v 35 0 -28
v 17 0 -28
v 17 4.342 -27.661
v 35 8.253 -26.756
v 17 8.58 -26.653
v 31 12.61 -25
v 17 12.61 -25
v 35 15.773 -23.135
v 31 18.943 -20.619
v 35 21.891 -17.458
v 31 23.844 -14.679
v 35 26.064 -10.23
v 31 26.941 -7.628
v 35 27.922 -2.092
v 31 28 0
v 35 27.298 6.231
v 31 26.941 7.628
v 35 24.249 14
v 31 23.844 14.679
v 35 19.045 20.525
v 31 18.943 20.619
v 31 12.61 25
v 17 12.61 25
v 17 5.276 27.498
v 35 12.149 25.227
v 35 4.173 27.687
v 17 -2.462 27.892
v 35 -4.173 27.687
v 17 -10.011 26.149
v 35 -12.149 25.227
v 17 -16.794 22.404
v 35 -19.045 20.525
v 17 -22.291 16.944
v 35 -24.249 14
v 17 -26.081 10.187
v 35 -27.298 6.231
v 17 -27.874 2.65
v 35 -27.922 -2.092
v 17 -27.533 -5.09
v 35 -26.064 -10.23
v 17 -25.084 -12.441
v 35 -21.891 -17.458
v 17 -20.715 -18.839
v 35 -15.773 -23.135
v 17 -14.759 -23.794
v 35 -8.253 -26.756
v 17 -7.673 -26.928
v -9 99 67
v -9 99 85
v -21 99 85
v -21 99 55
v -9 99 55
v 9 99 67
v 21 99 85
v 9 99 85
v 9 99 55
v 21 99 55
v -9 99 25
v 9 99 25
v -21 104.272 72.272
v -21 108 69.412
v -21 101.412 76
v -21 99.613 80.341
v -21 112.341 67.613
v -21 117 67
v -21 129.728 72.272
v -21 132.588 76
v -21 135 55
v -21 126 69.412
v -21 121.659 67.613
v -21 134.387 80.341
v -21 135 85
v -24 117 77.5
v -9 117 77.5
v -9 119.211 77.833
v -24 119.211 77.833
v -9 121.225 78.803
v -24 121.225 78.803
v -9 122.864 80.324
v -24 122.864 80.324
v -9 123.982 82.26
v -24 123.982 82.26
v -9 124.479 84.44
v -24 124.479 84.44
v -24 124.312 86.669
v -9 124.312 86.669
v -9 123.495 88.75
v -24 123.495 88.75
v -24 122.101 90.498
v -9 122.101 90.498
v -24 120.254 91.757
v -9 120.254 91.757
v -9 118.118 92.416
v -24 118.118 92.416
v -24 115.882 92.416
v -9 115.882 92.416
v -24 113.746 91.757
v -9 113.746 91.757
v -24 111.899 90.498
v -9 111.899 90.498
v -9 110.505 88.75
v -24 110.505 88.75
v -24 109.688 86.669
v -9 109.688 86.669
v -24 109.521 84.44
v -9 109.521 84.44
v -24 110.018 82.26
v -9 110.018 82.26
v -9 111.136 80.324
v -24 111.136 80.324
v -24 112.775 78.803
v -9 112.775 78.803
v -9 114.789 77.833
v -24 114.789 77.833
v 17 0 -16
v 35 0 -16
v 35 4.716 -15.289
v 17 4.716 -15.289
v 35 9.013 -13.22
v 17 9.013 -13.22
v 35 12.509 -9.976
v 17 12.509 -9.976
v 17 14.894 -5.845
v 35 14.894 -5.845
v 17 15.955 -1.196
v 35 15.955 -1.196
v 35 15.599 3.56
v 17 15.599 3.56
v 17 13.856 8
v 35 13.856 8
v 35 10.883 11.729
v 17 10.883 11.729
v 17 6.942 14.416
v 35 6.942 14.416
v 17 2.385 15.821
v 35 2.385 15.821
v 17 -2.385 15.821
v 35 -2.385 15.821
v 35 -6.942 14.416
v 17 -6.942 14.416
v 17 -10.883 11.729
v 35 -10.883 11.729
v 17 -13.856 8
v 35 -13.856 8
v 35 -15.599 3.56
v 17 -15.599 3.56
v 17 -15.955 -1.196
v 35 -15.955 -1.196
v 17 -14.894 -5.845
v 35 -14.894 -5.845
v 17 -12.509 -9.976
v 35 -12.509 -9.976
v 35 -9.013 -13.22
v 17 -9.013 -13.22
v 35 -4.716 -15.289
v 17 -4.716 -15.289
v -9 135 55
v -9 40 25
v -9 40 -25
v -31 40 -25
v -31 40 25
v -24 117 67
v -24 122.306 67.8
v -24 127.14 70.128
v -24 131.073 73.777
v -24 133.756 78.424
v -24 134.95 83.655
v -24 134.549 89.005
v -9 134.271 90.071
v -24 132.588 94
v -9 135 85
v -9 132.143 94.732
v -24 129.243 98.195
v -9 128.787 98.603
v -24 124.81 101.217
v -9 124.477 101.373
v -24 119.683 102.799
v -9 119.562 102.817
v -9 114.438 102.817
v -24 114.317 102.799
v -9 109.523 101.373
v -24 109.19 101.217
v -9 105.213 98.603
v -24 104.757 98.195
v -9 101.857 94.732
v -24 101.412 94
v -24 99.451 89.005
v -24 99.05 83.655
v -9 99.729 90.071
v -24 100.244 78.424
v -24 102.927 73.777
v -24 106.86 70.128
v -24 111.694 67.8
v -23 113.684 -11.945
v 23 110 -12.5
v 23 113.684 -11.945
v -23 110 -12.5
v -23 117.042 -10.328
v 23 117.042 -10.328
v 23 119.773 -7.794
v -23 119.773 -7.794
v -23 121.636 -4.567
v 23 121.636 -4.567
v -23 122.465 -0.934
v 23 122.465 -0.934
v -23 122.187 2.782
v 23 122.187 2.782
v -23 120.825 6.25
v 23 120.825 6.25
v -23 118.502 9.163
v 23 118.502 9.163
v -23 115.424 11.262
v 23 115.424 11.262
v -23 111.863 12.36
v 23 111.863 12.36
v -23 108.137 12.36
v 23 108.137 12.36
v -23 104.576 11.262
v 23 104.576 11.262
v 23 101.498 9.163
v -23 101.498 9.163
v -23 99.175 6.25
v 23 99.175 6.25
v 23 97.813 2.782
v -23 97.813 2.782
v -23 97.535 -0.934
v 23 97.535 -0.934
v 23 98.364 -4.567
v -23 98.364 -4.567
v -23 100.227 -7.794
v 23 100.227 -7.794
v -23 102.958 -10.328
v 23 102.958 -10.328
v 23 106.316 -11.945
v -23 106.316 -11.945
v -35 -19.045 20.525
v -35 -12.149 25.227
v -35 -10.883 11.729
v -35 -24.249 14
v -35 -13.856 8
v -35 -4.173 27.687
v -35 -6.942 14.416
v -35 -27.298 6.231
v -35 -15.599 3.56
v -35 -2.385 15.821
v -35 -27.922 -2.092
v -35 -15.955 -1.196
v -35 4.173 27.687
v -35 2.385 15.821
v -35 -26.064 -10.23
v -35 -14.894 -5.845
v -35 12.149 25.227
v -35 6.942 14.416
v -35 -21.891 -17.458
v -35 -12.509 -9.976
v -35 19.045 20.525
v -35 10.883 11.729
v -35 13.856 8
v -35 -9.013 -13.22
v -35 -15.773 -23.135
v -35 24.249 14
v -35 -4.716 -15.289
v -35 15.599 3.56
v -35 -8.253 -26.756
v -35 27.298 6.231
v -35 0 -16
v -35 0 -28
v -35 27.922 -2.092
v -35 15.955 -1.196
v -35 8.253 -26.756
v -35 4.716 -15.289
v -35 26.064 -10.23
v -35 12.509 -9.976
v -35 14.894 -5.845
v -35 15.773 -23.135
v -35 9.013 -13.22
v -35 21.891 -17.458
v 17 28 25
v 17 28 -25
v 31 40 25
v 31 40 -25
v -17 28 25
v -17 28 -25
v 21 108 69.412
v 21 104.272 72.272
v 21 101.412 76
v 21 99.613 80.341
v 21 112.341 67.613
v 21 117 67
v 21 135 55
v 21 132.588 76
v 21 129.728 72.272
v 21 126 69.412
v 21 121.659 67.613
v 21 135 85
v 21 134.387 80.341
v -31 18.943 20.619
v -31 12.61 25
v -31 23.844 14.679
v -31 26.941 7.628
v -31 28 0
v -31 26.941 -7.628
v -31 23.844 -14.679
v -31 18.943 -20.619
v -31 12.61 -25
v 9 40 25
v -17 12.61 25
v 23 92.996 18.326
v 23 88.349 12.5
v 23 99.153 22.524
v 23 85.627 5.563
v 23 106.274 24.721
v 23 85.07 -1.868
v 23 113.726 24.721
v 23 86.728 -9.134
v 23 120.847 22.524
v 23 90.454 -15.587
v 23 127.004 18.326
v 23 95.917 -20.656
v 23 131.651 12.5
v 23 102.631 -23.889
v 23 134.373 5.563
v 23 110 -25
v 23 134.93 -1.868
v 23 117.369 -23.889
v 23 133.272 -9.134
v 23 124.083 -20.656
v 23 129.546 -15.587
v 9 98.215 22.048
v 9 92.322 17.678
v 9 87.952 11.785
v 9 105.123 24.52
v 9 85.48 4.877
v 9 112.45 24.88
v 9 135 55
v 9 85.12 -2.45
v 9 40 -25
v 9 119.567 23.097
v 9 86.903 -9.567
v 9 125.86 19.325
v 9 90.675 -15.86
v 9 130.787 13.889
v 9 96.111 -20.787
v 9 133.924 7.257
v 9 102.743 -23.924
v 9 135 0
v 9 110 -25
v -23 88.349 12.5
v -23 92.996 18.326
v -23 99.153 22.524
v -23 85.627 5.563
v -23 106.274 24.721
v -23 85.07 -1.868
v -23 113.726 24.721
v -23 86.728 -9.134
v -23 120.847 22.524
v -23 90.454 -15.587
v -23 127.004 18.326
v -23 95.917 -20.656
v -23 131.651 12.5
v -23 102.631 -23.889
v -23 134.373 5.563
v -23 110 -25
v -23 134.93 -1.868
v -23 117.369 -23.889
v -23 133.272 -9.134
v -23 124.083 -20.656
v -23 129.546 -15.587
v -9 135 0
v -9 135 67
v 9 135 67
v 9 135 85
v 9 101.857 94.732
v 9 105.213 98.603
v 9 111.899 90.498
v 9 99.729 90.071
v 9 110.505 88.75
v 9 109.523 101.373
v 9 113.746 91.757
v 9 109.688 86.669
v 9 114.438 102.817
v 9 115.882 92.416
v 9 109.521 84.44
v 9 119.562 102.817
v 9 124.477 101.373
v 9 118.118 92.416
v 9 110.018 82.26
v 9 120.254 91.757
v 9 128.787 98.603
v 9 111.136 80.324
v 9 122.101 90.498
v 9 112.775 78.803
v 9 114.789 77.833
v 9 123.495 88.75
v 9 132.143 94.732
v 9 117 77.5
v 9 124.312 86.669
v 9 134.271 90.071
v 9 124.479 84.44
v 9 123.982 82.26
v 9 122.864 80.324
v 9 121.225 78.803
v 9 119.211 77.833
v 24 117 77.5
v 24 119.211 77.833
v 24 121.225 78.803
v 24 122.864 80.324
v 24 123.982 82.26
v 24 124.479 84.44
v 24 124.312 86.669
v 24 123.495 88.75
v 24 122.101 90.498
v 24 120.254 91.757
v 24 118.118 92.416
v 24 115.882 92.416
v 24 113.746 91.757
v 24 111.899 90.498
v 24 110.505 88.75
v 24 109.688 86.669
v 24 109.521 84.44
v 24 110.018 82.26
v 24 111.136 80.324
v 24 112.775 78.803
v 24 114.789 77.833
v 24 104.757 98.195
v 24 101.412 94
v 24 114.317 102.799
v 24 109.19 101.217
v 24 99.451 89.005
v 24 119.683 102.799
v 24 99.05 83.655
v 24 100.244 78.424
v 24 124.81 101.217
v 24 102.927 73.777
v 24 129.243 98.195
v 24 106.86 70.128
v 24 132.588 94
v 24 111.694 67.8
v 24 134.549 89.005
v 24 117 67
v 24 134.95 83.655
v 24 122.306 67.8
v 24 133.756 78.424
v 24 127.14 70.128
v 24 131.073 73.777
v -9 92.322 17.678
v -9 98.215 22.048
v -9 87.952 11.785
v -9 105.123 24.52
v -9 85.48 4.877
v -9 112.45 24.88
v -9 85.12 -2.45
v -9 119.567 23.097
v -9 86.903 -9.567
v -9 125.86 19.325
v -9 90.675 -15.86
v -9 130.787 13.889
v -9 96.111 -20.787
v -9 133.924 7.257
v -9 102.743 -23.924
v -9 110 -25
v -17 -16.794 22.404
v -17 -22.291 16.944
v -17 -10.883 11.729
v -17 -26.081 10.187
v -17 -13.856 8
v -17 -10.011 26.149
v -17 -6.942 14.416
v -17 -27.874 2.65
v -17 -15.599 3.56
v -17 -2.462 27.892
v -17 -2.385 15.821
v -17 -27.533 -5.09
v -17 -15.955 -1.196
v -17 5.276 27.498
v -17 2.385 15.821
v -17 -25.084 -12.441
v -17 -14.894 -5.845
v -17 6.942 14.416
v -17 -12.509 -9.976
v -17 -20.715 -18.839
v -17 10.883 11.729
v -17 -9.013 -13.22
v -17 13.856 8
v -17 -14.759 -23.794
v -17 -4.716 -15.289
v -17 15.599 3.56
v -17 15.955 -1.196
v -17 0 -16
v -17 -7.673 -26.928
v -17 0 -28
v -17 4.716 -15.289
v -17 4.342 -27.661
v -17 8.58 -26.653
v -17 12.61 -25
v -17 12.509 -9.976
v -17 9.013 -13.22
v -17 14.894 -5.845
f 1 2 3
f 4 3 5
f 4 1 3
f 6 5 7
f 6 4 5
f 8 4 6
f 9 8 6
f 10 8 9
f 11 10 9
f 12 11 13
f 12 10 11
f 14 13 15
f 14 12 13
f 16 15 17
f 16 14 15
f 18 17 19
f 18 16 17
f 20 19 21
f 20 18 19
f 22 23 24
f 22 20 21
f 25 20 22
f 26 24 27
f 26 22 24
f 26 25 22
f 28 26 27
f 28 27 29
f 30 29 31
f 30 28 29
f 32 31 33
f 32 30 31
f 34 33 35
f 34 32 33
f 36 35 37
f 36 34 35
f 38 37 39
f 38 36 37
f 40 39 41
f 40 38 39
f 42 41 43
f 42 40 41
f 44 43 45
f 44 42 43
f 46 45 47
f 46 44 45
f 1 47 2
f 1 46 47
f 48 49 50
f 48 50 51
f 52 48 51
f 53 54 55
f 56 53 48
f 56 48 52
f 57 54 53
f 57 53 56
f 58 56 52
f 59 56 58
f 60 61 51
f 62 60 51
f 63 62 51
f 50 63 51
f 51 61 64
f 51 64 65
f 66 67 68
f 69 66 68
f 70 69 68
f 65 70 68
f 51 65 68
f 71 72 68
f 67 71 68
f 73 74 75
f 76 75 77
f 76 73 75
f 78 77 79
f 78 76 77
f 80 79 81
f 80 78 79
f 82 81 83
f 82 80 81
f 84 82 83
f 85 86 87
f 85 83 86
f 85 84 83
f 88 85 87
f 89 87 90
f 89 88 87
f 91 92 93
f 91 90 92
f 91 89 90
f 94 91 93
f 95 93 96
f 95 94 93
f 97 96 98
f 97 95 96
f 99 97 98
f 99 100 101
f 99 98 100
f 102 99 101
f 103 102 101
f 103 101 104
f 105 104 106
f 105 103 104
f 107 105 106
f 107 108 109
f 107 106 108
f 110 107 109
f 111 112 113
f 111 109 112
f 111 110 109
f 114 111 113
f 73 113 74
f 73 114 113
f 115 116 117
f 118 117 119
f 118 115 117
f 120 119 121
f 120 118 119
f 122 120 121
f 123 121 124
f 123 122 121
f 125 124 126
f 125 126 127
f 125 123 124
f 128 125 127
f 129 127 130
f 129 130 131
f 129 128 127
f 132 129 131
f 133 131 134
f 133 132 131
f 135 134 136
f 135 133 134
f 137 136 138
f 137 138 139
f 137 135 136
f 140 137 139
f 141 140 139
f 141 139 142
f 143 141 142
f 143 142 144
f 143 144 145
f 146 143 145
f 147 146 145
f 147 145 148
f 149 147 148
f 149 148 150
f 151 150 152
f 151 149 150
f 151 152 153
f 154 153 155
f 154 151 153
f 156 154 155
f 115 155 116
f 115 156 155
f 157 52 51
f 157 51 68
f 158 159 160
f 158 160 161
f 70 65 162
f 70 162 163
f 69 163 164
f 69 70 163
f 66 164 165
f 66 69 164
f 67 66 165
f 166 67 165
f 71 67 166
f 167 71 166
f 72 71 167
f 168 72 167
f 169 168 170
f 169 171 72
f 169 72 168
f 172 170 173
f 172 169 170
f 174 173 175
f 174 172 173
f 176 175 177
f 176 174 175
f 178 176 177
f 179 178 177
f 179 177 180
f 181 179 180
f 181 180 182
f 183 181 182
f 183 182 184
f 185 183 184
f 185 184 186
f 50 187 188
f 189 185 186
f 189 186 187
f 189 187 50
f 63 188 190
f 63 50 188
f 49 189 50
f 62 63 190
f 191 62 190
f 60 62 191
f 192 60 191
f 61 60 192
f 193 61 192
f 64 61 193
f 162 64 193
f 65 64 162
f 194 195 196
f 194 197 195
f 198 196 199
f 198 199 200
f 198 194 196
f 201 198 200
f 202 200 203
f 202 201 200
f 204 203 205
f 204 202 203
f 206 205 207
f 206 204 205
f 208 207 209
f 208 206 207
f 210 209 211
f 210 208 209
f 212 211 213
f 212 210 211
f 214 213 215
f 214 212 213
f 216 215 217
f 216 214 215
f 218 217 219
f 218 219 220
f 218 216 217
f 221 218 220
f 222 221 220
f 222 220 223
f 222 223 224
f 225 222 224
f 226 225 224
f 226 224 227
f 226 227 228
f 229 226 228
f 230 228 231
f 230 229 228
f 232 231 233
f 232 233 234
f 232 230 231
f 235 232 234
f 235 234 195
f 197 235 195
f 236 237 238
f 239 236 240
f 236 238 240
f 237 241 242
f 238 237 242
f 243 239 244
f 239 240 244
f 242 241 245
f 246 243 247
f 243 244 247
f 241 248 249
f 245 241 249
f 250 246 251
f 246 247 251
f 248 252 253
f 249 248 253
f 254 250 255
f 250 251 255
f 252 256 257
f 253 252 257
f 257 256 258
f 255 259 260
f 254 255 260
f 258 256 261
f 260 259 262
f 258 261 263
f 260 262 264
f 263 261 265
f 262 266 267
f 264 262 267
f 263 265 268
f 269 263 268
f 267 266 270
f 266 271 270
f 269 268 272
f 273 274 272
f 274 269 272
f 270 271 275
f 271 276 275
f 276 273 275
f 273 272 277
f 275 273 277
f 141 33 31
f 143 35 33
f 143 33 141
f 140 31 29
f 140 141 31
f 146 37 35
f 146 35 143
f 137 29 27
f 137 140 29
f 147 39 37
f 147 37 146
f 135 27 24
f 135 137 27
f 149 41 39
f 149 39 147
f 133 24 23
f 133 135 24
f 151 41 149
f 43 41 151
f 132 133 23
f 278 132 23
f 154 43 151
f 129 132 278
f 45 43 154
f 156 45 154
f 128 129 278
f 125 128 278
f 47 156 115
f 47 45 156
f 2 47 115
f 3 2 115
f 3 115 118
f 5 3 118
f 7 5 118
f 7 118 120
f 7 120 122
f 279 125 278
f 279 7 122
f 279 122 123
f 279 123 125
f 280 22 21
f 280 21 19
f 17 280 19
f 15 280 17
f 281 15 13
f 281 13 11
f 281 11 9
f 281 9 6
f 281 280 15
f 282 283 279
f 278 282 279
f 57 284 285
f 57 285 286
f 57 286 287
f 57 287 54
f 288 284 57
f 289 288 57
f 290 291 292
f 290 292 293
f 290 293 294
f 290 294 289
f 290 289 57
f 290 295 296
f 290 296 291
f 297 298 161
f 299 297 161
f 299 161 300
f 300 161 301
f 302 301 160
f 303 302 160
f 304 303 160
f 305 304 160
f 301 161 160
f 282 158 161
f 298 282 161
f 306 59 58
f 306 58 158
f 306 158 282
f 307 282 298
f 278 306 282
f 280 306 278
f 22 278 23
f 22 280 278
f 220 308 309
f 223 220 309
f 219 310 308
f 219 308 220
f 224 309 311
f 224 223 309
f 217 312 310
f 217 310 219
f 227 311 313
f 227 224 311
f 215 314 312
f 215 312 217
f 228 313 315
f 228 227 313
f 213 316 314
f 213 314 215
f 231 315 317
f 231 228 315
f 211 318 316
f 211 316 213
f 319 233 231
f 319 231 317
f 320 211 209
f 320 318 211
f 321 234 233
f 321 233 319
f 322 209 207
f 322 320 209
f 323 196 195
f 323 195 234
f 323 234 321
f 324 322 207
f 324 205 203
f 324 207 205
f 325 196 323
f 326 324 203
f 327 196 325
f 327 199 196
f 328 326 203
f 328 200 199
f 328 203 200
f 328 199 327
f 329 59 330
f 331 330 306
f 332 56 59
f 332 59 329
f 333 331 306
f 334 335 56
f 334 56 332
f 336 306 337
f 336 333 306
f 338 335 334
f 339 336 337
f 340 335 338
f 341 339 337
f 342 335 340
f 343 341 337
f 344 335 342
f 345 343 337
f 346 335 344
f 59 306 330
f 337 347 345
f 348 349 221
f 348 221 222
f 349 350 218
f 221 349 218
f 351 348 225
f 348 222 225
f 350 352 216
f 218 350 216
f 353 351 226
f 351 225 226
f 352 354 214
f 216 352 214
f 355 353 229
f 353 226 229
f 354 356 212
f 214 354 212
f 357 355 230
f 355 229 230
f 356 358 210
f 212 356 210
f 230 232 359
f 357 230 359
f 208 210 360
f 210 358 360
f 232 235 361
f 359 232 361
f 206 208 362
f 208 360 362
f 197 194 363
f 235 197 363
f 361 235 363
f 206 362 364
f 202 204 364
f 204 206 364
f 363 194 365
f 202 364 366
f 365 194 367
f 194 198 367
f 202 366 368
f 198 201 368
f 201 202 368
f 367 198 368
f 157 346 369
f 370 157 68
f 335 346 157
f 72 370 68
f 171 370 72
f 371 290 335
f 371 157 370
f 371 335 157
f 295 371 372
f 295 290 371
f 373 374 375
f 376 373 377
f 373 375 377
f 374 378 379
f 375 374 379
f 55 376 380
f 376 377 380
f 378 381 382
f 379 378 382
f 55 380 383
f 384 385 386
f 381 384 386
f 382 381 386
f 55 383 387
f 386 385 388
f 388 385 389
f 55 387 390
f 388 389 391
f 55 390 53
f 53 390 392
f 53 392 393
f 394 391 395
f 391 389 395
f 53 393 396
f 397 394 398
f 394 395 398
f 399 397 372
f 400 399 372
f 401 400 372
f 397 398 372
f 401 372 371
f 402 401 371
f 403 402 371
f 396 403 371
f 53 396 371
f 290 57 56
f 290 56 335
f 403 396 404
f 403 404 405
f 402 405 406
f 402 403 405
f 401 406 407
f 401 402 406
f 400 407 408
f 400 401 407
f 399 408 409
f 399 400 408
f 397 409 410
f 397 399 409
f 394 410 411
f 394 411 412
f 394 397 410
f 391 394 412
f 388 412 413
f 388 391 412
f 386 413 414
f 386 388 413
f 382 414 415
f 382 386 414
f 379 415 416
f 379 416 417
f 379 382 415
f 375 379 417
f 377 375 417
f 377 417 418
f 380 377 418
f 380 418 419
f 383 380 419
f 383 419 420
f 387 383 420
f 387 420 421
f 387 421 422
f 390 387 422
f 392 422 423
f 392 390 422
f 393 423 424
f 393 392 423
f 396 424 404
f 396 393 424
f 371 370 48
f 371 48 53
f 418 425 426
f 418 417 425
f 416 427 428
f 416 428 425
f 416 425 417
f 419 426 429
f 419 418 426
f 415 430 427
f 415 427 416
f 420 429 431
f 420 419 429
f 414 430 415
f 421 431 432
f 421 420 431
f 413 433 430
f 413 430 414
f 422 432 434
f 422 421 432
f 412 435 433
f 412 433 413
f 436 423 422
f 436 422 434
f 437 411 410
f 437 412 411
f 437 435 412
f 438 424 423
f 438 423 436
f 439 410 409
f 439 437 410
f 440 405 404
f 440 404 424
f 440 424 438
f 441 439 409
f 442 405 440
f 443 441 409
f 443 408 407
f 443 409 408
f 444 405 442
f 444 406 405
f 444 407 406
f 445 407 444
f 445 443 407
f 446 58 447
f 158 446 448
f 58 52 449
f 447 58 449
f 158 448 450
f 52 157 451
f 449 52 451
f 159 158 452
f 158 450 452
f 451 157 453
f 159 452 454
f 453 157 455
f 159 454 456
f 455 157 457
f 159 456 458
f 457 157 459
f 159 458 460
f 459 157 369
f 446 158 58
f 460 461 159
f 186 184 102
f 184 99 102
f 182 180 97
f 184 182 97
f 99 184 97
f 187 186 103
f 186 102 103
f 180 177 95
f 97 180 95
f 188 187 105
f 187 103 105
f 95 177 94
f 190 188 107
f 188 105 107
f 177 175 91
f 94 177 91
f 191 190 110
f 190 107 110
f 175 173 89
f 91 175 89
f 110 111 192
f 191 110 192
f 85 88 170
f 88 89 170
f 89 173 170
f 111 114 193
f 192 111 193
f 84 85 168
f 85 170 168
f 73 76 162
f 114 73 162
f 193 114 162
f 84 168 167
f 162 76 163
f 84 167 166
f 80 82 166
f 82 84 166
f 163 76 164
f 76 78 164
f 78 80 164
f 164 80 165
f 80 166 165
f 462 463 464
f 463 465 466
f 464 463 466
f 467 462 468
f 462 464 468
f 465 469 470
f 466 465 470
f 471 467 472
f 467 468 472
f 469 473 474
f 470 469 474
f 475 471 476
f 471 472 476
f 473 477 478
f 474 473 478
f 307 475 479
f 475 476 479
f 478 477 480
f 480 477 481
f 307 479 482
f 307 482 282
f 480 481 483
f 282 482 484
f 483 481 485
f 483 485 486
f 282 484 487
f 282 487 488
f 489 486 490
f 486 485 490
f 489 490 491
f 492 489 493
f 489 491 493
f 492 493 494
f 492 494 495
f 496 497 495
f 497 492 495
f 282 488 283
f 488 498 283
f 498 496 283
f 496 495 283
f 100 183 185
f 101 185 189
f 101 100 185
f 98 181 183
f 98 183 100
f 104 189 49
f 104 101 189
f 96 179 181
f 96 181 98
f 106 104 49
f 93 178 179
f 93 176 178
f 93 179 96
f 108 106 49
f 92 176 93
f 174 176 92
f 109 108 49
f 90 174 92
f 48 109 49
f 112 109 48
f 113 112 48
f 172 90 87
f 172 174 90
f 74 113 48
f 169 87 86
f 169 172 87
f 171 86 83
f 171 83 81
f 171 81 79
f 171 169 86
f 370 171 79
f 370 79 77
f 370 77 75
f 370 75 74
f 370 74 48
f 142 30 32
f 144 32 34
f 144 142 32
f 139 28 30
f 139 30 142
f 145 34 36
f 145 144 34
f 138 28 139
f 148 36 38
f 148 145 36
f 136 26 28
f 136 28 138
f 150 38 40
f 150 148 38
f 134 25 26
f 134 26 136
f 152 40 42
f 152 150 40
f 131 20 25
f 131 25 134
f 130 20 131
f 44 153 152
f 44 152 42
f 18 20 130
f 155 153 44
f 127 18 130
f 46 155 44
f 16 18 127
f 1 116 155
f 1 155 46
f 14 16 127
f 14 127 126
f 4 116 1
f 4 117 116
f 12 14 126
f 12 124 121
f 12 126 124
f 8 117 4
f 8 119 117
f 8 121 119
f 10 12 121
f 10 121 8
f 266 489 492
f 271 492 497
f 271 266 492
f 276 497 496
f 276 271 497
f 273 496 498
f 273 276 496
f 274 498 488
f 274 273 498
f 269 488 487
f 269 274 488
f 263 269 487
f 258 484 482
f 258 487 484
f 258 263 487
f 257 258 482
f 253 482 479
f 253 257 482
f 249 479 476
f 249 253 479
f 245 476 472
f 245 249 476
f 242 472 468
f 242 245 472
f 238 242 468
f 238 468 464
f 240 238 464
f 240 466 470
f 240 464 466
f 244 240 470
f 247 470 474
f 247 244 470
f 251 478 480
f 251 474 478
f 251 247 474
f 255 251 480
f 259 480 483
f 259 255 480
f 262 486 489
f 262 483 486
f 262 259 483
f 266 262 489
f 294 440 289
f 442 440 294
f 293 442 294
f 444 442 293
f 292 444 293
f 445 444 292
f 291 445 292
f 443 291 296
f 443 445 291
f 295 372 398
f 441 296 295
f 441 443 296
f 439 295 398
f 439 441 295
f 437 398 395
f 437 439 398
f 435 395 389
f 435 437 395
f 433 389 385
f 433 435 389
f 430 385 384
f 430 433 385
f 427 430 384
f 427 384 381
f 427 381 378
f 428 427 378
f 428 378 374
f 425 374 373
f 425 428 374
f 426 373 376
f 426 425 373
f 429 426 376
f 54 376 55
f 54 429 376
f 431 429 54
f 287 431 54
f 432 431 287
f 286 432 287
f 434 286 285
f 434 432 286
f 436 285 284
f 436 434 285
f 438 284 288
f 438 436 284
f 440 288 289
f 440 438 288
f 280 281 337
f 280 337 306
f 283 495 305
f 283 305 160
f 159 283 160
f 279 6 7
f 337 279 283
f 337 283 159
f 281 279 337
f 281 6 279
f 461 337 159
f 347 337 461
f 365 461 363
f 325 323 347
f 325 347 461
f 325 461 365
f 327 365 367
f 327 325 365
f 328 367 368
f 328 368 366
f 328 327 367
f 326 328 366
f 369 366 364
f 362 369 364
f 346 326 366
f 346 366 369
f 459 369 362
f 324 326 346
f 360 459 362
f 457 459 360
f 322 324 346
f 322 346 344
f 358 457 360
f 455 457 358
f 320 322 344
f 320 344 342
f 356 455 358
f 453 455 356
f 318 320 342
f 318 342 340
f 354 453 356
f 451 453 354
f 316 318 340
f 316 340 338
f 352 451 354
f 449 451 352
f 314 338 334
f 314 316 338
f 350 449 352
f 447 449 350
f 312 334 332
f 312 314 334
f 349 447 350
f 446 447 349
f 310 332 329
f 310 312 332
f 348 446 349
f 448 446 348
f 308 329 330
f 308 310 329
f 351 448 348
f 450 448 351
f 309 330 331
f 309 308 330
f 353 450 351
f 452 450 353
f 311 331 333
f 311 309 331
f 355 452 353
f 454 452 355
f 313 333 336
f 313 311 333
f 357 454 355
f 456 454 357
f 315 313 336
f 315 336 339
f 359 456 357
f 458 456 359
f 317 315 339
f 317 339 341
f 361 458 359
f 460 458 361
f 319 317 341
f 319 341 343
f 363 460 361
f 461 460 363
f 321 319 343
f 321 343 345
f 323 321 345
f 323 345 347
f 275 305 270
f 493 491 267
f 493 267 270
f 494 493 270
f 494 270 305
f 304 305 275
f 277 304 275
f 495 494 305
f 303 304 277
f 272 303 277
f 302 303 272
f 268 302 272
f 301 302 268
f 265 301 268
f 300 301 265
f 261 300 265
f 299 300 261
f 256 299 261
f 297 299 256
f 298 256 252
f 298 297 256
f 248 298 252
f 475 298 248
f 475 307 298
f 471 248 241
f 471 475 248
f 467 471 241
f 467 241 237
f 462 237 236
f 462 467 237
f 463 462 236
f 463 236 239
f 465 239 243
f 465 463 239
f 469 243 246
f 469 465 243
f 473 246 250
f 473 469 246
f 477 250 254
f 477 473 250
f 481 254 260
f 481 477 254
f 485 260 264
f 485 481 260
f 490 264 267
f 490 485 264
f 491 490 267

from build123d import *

# Parameters (mm, degrees)
BOSS_EXTRUDE1_DEPTH     = 9
SKETCH1_3_R             = 25
SKETCH1_3_R_2           = 12.5
BOSS_EXTRUDE2_DEPTH     = 23
SKETCH1_5_R             = 28
SKETCH1_5_R_2           = 16
BOSS_EXTRUDE3_DEPTH     = 35
BOSS_EXTRUDE4_DEPTH     = 31
BOSS_EXTRUDE5_DEPTH     = 21
SKETCH1_8_R             = 18
SKETCH1_8_R_2           = 7.5
BOSS_EXTRUDE6_DEPTH     = 24
SKETCH2_W               = 34
SKETCH2_H               = 56
CUT_EXTRUDE1_DEPTH      = 104
CUT_EXTRUDE1_DEPTH_BACK = 29
SKETCH3_W               = 18
SKETCH3_H               = 36
CUT_EXTRUDE2_DEPTH      = 1
CUT_EXTRUDE2_DEPTH_BACK = 164


with BuildPart() as part:
    # Sketch1 → Boss-Extrude1 (new body, symmetric)
    with BuildSketch(Plane(origin=(0, 0, 0), x_dir=(0, 0, -1), z_dir=(1, 0, 0))):
        with BuildLine():
            ThreePointArc((25, 110), (-17.67766953, 92.32233047), (0, 135))
            Line((0, 135), (-55, 135))
            Line((-55, 135), (-55, 99))
            Line((-55, 99), (-25, 99))
            Line((-25, 99), (-25, 40))
            Line((-25, 40), (25, 40))
            Line((25, 40), (25, 110))
        make_face()
    extrude(amount=BOSS_EXTRUDE1_DEPTH, both=True)

    # Sketch1<3> → Boss-Extrude2 (add, symmetric)
    with BuildSketch(Plane(origin=(0, 0, 0), x_dir=(0, 0, -1), z_dir=(1, 0, 0))):
        with Locations((0, 110)):
            Circle(SKETCH1_3_R)
        with Locations((0, 110)):
            Circle(SKETCH1_3_R_2, mode=Mode.SUBTRACT)
    extrude(amount=BOSS_EXTRUDE2_DEPTH, both=True)



with BuildPart() as body_2:
    # Sketch1<5> → Boss-Extrude3 (new body, symmetric)
    with BuildSketch(Plane(origin=(0, 0, 0), x_dir=(0, 0, -1), z_dir=(1, 0, 0))):
        Circle(SKETCH1_5_R)
        Circle(SKETCH1_5_R_2, mode=Mode.SUBTRACT)
    extrude(amount=BOSS_EXTRUDE3_DEPTH, both=True)


with BuildPart() as part_1:
    add(part.part)

    add(body_2.part)  # Boss-Extrude4 merges body 2
    # Sketch1<6> → Boss-Extrude4 (add, symmetric)
    with BuildSketch(Plane(origin=(0, 0, 0), x_dir=(0, 0, -1), z_dir=(1, 0, 0))):
        with BuildLine():
            Line((25, 40), (-25, 40))
            Line((-25, 40), (-25, 12.609520213))
            ThreePointArc((-25, 12.609520213), (0, 28), (25, 12.609520213))
            Line((25, 12.609520213), (25, 40))
        make_face()
    extrude(amount=BOSS_EXTRUDE4_DEPTH, both=True)

    # Sketch1<7> → Boss-Extrude5 (add, symmetric)
    with BuildSketch(Plane(origin=(0, 0, 0), x_dir=(0, 0, -1), z_dir=(1, 0, 0))):
        with BuildLine():
            Line((-85, 99), (-55, 99))
            Line((-55, 99), (-55, 135))
            Line((-55, 135), (-85, 135))
            ThreePointArc((-85, 135), (-72.272077939, 129.727922061), (-67, 117))
            ThreePointArc((-67, 117), (-72.272077939, 104.272077939), (-85, 99))
        make_face()
    extrude(amount=BOSS_EXTRUDE5_DEPTH, both=True)

    # Sketch1<8> → Boss-Extrude6 (add, symmetric)
    with BuildSketch(Plane(origin=(0, 0, 0), x_dir=(0, 0, -1), z_dir=(1, 0, 0))):
        with Locations((-85, 117)):
            Circle(SKETCH1_8_R)
        with Locations((-85, 117)):
            Circle(SKETCH1_8_R_2, mode=Mode.SUBTRACT)
    extrude(amount=BOSS_EXTRUDE6_DEPTH, both=True)

    # Sketch2 → Cut-Extrude1 (cut, two sides)
    with BuildSketch(Plane.XY) as cut_extrude1_sk:
        Rectangle(SKETCH2_W, SKETCH2_H)
    extrude(amount=CUT_EXTRUDE1_DEPTH, mode=Mode.SUBTRACT)
    extrude(cut_extrude1_sk.sketch, amount=-CUT_EXTRUDE1_DEPTH_BACK, mode=Mode.SUBTRACT)

    # Sketch3 → Cut-Extrude2 (cut, two sides)
    with BuildSketch(Plane(origin=(0, 135, 0), x_dir=(1, 0, 0), z_dir=(0, 1, 0))) as cut_extrude2_sk:
        with Locations((0, -85)):
            Rectangle(SKETCH3_W, SKETCH3_H)
    extrude(amount=CUT_EXTRUDE2_DEPTH, mode=Mode.SUBTRACT)
    extrude(cut_extrude2_sk.sketch, amount=-CUT_EXTRUDE2_DEPTH_BACK, mode=Mode.SUBTRACT)


solid = part_1.part
